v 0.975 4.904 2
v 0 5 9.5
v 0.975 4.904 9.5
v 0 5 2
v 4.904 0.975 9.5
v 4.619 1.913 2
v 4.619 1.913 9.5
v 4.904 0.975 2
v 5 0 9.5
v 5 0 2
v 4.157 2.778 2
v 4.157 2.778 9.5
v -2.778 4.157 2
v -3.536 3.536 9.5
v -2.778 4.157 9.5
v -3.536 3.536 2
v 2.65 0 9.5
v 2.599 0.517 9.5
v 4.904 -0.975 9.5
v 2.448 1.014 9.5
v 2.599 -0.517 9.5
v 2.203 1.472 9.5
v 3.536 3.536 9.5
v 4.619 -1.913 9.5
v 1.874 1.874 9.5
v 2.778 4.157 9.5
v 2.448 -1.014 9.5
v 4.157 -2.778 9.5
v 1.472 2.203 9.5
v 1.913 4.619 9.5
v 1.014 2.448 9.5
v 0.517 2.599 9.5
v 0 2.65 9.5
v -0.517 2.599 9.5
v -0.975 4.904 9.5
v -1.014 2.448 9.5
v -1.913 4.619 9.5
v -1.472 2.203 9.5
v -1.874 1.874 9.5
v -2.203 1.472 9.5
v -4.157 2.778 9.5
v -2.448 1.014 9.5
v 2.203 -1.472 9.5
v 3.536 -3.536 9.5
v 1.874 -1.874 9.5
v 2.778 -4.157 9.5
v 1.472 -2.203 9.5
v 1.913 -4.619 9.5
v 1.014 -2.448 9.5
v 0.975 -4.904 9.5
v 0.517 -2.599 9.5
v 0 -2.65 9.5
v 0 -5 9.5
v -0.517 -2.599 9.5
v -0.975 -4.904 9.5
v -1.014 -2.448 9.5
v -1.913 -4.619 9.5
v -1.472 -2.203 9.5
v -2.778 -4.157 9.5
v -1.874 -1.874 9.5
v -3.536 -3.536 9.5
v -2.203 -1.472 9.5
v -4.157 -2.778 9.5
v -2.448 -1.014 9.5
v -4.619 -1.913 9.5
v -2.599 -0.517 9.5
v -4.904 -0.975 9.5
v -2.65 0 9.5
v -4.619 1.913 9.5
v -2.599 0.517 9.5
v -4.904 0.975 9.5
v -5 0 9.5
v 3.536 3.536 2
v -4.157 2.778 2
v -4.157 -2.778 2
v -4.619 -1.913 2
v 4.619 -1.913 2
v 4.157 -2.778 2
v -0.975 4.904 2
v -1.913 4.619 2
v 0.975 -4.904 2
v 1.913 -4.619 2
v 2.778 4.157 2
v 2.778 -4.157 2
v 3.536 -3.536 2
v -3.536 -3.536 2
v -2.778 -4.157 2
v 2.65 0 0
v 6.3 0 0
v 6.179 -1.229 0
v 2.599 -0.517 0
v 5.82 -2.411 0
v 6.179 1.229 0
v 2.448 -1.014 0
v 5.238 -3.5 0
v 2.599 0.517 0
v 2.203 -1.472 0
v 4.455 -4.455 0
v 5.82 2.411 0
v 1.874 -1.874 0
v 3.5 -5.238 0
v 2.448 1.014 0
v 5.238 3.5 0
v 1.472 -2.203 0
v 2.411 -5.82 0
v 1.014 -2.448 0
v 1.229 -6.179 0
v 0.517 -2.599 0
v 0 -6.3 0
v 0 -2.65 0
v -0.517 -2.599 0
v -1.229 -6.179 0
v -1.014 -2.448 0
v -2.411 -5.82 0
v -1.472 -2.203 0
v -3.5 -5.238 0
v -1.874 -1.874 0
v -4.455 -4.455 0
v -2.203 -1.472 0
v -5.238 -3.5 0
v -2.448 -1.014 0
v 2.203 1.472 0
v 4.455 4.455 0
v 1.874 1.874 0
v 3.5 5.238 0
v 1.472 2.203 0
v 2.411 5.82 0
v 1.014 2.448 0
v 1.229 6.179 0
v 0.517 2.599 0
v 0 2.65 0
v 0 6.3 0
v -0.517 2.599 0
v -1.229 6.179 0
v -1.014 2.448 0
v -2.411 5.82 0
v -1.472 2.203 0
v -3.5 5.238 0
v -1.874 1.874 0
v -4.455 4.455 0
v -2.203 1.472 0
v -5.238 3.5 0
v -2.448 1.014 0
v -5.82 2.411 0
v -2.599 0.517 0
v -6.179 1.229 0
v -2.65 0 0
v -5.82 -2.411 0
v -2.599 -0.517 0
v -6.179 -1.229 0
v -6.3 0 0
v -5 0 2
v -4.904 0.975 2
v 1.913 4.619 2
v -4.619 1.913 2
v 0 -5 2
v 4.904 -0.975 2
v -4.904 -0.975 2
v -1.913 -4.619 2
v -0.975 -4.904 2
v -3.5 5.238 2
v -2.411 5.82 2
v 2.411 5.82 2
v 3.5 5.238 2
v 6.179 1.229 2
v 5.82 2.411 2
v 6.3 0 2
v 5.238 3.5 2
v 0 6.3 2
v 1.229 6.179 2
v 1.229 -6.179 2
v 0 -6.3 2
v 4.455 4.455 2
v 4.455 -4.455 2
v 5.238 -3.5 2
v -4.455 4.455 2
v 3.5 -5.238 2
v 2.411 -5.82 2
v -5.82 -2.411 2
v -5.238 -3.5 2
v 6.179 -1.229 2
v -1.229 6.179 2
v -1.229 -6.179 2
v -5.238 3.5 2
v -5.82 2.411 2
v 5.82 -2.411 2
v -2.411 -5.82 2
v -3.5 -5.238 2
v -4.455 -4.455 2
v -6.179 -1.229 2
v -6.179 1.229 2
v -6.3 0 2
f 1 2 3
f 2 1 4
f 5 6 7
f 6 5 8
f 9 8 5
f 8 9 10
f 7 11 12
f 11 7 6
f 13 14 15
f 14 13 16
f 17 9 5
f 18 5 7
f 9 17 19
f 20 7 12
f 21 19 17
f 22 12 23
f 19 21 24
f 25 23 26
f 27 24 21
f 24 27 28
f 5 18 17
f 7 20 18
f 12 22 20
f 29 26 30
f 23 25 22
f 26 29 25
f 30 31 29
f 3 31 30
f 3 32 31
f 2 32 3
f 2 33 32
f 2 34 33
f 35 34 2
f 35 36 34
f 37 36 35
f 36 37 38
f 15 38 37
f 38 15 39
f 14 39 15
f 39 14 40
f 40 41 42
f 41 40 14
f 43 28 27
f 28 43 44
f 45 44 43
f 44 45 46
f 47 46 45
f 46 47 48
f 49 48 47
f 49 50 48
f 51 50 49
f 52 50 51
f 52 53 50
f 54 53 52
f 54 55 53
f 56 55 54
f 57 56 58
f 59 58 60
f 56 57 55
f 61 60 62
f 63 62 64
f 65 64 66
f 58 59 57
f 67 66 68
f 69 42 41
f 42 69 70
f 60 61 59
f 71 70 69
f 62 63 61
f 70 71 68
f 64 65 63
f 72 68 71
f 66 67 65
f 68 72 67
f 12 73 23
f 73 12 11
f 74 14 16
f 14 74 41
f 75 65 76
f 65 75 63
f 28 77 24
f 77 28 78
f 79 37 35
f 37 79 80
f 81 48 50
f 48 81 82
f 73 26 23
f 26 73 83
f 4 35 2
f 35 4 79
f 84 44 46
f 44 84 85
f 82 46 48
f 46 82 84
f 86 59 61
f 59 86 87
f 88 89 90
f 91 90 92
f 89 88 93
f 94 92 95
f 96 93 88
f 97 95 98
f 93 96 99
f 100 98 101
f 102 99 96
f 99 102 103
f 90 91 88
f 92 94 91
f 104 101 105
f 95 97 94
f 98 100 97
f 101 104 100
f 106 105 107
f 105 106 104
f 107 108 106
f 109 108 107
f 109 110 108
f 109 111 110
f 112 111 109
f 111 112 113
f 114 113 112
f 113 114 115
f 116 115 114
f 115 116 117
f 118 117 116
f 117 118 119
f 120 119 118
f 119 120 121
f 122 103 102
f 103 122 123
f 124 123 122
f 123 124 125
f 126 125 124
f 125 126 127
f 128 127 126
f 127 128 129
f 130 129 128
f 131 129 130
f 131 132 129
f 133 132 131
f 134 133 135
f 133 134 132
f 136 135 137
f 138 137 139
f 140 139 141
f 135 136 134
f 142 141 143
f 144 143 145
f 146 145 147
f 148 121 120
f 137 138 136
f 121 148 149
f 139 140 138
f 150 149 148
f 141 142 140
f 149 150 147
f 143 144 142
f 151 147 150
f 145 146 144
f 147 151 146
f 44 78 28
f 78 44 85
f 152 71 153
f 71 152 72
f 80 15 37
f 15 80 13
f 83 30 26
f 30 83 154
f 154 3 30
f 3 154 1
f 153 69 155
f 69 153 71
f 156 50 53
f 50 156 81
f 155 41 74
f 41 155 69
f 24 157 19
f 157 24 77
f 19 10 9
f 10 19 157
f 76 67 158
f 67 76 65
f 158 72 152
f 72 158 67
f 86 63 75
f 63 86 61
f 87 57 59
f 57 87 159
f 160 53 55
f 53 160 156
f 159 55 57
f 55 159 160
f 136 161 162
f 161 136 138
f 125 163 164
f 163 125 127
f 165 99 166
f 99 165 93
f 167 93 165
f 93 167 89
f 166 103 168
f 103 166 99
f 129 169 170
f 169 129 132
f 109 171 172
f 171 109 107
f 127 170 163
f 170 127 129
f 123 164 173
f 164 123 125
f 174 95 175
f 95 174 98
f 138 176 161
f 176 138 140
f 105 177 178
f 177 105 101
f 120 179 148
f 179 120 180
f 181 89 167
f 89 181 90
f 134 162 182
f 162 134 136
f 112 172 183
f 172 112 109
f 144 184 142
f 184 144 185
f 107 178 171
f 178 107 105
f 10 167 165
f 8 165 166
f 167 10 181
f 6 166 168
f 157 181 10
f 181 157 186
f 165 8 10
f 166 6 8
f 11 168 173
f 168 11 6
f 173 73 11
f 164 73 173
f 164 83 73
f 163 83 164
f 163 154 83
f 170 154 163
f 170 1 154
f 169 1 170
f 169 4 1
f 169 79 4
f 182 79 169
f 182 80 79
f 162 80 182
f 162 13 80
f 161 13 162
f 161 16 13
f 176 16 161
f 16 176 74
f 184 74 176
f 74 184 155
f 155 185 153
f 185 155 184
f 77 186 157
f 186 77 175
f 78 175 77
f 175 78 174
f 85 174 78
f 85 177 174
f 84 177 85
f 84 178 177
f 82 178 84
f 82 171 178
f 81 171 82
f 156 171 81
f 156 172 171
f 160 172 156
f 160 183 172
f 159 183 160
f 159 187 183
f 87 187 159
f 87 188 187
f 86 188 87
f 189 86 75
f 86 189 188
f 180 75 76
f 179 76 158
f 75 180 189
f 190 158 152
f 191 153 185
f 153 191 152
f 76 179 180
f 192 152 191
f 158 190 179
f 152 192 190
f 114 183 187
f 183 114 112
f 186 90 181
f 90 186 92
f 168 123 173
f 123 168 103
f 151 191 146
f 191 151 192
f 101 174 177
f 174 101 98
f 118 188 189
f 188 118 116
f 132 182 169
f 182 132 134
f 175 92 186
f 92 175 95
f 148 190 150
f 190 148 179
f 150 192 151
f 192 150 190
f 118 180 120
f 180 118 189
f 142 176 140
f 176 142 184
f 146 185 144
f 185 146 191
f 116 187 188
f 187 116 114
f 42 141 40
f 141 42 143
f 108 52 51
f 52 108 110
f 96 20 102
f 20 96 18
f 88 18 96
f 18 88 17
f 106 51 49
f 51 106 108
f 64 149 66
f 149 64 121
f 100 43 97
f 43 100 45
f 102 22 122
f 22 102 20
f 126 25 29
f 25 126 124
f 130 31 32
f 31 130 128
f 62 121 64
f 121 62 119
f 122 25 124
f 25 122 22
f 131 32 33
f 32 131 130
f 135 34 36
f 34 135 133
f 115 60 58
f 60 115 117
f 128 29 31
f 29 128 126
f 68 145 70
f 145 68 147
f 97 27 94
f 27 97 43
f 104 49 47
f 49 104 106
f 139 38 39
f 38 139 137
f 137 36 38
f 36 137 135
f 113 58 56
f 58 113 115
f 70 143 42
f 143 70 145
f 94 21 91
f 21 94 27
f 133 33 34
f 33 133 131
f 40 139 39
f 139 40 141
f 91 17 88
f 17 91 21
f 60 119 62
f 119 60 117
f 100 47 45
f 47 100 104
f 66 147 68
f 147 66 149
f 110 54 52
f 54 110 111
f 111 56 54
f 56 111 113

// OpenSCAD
hole_diameter = 10.0;
rod_diameter = 5.3;
hole_depth = 7.5;
top_height = 2.0;
top_diameter = 12.6;

difference()
{
    union()
    {
        cylinder(
            h = hole_depth + top_height,
            d = hole_diameter,
            $fn = 32);
        
        cylinder(
            h = top_height,
            d = top_diameter,
            $fn = 32);
    }
    cylinder(
        h = 2.1 * (top_height + hole_depth),
        d = rod_diameter,
        center = true,
        $fn = 32);
    }
